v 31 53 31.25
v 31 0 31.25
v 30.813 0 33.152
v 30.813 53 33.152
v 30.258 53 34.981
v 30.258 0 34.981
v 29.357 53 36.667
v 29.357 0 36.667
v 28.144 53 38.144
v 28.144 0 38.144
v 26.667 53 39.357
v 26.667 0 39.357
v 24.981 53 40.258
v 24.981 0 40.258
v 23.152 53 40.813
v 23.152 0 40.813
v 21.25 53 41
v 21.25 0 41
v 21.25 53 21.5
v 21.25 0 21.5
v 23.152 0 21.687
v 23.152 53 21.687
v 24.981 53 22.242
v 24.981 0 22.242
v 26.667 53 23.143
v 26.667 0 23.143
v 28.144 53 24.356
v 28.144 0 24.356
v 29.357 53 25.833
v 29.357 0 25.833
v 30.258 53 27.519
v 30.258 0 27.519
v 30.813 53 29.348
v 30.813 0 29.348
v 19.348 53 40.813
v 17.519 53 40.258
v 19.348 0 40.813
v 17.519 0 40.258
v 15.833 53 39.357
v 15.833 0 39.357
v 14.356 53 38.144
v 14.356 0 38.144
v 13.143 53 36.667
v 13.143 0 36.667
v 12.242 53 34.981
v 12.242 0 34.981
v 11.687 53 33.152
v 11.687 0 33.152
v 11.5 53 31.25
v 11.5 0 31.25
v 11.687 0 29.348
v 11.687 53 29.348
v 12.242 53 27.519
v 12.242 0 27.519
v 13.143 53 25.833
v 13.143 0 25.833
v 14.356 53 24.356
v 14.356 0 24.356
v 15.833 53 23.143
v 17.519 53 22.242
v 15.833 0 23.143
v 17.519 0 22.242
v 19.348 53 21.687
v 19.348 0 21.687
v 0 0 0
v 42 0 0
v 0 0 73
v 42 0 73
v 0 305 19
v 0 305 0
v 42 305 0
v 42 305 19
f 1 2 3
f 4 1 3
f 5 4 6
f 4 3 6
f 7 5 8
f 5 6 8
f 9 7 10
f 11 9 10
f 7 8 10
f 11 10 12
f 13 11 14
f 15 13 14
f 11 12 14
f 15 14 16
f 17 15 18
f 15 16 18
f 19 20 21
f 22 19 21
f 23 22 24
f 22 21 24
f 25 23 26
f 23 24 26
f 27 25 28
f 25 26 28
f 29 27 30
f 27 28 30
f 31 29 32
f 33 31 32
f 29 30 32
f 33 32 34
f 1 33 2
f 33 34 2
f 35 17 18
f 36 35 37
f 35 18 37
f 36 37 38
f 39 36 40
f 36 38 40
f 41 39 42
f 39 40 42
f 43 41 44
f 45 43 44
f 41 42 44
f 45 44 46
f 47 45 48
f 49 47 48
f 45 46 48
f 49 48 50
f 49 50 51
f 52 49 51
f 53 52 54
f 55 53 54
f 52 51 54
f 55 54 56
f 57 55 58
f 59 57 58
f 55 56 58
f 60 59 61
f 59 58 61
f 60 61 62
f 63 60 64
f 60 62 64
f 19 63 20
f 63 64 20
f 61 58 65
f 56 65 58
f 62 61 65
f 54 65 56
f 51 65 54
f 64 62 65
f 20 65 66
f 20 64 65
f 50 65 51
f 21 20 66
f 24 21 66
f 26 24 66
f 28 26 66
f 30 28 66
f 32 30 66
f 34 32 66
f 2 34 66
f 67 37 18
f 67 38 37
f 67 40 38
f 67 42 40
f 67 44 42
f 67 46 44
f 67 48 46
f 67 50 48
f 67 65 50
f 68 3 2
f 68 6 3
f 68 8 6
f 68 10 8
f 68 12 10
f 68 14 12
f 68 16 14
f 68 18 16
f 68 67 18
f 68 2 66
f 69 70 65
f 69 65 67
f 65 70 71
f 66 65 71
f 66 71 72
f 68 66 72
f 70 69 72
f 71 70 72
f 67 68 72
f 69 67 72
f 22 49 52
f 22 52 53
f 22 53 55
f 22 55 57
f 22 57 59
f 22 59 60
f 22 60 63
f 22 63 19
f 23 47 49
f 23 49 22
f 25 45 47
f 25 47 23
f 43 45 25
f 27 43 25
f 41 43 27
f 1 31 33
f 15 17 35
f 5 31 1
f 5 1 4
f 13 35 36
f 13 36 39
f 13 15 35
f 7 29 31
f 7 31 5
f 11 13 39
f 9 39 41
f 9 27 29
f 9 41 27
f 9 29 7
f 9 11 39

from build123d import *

# Parameters (mm, degrees)
F0_W     = 42
F0_H     = 73
F1_DEPTH = 305
F3_DEPTH = 42
F5_DEPTH = 53


with BuildPart() as f1:
    # F0 (on Front) → F1 (new body)
    with BuildSketch(Plane.XZ):
        with Locations((21, 36.5)):
            Rectangle(F0_W, F0_H)
    extrude(amount=-F1_DEPTH)

    # F2 (on face) → F3 (cut)
    with BuildSketch(Plane.YZ.offset(42)):
        Polygon((0, 73), (305, 19), (305, 73), align=None)
    extrude(amount=-F3_DEPTH, mode=Mode.SUBTRACT)

    # F4 (on face) → F5 (cut)
    with BuildSketch(Plane.XZ):
        with BuildLine():
            ThreePointArc((31, 31.2498826658), (31.0000000005, 31.2499413329), (31.0000000007, 31.25))
            ThreePointArc((31.0000000007, 31.25), (28.1442994854, 38.1442827484), (21.2500236693, 41))
            ThreePointArc((21.2500236693, 41), (14.3557172523, 38.1442994847), (11.5000000007, 31.25))
            ThreePointArc((11.5000000007, 31.25), (14.3557088841, 24.3557088834), (21.2500000007, 21.5))
            ThreePointArc((21.2500000007, 21.5), (28.1442496332, 24.3556673997), (31, 31.2498826658))
        make_face()
    extrude(amount=-F5_DEPTH, mode=Mode.SUBTRACT)


solid = f1.part
